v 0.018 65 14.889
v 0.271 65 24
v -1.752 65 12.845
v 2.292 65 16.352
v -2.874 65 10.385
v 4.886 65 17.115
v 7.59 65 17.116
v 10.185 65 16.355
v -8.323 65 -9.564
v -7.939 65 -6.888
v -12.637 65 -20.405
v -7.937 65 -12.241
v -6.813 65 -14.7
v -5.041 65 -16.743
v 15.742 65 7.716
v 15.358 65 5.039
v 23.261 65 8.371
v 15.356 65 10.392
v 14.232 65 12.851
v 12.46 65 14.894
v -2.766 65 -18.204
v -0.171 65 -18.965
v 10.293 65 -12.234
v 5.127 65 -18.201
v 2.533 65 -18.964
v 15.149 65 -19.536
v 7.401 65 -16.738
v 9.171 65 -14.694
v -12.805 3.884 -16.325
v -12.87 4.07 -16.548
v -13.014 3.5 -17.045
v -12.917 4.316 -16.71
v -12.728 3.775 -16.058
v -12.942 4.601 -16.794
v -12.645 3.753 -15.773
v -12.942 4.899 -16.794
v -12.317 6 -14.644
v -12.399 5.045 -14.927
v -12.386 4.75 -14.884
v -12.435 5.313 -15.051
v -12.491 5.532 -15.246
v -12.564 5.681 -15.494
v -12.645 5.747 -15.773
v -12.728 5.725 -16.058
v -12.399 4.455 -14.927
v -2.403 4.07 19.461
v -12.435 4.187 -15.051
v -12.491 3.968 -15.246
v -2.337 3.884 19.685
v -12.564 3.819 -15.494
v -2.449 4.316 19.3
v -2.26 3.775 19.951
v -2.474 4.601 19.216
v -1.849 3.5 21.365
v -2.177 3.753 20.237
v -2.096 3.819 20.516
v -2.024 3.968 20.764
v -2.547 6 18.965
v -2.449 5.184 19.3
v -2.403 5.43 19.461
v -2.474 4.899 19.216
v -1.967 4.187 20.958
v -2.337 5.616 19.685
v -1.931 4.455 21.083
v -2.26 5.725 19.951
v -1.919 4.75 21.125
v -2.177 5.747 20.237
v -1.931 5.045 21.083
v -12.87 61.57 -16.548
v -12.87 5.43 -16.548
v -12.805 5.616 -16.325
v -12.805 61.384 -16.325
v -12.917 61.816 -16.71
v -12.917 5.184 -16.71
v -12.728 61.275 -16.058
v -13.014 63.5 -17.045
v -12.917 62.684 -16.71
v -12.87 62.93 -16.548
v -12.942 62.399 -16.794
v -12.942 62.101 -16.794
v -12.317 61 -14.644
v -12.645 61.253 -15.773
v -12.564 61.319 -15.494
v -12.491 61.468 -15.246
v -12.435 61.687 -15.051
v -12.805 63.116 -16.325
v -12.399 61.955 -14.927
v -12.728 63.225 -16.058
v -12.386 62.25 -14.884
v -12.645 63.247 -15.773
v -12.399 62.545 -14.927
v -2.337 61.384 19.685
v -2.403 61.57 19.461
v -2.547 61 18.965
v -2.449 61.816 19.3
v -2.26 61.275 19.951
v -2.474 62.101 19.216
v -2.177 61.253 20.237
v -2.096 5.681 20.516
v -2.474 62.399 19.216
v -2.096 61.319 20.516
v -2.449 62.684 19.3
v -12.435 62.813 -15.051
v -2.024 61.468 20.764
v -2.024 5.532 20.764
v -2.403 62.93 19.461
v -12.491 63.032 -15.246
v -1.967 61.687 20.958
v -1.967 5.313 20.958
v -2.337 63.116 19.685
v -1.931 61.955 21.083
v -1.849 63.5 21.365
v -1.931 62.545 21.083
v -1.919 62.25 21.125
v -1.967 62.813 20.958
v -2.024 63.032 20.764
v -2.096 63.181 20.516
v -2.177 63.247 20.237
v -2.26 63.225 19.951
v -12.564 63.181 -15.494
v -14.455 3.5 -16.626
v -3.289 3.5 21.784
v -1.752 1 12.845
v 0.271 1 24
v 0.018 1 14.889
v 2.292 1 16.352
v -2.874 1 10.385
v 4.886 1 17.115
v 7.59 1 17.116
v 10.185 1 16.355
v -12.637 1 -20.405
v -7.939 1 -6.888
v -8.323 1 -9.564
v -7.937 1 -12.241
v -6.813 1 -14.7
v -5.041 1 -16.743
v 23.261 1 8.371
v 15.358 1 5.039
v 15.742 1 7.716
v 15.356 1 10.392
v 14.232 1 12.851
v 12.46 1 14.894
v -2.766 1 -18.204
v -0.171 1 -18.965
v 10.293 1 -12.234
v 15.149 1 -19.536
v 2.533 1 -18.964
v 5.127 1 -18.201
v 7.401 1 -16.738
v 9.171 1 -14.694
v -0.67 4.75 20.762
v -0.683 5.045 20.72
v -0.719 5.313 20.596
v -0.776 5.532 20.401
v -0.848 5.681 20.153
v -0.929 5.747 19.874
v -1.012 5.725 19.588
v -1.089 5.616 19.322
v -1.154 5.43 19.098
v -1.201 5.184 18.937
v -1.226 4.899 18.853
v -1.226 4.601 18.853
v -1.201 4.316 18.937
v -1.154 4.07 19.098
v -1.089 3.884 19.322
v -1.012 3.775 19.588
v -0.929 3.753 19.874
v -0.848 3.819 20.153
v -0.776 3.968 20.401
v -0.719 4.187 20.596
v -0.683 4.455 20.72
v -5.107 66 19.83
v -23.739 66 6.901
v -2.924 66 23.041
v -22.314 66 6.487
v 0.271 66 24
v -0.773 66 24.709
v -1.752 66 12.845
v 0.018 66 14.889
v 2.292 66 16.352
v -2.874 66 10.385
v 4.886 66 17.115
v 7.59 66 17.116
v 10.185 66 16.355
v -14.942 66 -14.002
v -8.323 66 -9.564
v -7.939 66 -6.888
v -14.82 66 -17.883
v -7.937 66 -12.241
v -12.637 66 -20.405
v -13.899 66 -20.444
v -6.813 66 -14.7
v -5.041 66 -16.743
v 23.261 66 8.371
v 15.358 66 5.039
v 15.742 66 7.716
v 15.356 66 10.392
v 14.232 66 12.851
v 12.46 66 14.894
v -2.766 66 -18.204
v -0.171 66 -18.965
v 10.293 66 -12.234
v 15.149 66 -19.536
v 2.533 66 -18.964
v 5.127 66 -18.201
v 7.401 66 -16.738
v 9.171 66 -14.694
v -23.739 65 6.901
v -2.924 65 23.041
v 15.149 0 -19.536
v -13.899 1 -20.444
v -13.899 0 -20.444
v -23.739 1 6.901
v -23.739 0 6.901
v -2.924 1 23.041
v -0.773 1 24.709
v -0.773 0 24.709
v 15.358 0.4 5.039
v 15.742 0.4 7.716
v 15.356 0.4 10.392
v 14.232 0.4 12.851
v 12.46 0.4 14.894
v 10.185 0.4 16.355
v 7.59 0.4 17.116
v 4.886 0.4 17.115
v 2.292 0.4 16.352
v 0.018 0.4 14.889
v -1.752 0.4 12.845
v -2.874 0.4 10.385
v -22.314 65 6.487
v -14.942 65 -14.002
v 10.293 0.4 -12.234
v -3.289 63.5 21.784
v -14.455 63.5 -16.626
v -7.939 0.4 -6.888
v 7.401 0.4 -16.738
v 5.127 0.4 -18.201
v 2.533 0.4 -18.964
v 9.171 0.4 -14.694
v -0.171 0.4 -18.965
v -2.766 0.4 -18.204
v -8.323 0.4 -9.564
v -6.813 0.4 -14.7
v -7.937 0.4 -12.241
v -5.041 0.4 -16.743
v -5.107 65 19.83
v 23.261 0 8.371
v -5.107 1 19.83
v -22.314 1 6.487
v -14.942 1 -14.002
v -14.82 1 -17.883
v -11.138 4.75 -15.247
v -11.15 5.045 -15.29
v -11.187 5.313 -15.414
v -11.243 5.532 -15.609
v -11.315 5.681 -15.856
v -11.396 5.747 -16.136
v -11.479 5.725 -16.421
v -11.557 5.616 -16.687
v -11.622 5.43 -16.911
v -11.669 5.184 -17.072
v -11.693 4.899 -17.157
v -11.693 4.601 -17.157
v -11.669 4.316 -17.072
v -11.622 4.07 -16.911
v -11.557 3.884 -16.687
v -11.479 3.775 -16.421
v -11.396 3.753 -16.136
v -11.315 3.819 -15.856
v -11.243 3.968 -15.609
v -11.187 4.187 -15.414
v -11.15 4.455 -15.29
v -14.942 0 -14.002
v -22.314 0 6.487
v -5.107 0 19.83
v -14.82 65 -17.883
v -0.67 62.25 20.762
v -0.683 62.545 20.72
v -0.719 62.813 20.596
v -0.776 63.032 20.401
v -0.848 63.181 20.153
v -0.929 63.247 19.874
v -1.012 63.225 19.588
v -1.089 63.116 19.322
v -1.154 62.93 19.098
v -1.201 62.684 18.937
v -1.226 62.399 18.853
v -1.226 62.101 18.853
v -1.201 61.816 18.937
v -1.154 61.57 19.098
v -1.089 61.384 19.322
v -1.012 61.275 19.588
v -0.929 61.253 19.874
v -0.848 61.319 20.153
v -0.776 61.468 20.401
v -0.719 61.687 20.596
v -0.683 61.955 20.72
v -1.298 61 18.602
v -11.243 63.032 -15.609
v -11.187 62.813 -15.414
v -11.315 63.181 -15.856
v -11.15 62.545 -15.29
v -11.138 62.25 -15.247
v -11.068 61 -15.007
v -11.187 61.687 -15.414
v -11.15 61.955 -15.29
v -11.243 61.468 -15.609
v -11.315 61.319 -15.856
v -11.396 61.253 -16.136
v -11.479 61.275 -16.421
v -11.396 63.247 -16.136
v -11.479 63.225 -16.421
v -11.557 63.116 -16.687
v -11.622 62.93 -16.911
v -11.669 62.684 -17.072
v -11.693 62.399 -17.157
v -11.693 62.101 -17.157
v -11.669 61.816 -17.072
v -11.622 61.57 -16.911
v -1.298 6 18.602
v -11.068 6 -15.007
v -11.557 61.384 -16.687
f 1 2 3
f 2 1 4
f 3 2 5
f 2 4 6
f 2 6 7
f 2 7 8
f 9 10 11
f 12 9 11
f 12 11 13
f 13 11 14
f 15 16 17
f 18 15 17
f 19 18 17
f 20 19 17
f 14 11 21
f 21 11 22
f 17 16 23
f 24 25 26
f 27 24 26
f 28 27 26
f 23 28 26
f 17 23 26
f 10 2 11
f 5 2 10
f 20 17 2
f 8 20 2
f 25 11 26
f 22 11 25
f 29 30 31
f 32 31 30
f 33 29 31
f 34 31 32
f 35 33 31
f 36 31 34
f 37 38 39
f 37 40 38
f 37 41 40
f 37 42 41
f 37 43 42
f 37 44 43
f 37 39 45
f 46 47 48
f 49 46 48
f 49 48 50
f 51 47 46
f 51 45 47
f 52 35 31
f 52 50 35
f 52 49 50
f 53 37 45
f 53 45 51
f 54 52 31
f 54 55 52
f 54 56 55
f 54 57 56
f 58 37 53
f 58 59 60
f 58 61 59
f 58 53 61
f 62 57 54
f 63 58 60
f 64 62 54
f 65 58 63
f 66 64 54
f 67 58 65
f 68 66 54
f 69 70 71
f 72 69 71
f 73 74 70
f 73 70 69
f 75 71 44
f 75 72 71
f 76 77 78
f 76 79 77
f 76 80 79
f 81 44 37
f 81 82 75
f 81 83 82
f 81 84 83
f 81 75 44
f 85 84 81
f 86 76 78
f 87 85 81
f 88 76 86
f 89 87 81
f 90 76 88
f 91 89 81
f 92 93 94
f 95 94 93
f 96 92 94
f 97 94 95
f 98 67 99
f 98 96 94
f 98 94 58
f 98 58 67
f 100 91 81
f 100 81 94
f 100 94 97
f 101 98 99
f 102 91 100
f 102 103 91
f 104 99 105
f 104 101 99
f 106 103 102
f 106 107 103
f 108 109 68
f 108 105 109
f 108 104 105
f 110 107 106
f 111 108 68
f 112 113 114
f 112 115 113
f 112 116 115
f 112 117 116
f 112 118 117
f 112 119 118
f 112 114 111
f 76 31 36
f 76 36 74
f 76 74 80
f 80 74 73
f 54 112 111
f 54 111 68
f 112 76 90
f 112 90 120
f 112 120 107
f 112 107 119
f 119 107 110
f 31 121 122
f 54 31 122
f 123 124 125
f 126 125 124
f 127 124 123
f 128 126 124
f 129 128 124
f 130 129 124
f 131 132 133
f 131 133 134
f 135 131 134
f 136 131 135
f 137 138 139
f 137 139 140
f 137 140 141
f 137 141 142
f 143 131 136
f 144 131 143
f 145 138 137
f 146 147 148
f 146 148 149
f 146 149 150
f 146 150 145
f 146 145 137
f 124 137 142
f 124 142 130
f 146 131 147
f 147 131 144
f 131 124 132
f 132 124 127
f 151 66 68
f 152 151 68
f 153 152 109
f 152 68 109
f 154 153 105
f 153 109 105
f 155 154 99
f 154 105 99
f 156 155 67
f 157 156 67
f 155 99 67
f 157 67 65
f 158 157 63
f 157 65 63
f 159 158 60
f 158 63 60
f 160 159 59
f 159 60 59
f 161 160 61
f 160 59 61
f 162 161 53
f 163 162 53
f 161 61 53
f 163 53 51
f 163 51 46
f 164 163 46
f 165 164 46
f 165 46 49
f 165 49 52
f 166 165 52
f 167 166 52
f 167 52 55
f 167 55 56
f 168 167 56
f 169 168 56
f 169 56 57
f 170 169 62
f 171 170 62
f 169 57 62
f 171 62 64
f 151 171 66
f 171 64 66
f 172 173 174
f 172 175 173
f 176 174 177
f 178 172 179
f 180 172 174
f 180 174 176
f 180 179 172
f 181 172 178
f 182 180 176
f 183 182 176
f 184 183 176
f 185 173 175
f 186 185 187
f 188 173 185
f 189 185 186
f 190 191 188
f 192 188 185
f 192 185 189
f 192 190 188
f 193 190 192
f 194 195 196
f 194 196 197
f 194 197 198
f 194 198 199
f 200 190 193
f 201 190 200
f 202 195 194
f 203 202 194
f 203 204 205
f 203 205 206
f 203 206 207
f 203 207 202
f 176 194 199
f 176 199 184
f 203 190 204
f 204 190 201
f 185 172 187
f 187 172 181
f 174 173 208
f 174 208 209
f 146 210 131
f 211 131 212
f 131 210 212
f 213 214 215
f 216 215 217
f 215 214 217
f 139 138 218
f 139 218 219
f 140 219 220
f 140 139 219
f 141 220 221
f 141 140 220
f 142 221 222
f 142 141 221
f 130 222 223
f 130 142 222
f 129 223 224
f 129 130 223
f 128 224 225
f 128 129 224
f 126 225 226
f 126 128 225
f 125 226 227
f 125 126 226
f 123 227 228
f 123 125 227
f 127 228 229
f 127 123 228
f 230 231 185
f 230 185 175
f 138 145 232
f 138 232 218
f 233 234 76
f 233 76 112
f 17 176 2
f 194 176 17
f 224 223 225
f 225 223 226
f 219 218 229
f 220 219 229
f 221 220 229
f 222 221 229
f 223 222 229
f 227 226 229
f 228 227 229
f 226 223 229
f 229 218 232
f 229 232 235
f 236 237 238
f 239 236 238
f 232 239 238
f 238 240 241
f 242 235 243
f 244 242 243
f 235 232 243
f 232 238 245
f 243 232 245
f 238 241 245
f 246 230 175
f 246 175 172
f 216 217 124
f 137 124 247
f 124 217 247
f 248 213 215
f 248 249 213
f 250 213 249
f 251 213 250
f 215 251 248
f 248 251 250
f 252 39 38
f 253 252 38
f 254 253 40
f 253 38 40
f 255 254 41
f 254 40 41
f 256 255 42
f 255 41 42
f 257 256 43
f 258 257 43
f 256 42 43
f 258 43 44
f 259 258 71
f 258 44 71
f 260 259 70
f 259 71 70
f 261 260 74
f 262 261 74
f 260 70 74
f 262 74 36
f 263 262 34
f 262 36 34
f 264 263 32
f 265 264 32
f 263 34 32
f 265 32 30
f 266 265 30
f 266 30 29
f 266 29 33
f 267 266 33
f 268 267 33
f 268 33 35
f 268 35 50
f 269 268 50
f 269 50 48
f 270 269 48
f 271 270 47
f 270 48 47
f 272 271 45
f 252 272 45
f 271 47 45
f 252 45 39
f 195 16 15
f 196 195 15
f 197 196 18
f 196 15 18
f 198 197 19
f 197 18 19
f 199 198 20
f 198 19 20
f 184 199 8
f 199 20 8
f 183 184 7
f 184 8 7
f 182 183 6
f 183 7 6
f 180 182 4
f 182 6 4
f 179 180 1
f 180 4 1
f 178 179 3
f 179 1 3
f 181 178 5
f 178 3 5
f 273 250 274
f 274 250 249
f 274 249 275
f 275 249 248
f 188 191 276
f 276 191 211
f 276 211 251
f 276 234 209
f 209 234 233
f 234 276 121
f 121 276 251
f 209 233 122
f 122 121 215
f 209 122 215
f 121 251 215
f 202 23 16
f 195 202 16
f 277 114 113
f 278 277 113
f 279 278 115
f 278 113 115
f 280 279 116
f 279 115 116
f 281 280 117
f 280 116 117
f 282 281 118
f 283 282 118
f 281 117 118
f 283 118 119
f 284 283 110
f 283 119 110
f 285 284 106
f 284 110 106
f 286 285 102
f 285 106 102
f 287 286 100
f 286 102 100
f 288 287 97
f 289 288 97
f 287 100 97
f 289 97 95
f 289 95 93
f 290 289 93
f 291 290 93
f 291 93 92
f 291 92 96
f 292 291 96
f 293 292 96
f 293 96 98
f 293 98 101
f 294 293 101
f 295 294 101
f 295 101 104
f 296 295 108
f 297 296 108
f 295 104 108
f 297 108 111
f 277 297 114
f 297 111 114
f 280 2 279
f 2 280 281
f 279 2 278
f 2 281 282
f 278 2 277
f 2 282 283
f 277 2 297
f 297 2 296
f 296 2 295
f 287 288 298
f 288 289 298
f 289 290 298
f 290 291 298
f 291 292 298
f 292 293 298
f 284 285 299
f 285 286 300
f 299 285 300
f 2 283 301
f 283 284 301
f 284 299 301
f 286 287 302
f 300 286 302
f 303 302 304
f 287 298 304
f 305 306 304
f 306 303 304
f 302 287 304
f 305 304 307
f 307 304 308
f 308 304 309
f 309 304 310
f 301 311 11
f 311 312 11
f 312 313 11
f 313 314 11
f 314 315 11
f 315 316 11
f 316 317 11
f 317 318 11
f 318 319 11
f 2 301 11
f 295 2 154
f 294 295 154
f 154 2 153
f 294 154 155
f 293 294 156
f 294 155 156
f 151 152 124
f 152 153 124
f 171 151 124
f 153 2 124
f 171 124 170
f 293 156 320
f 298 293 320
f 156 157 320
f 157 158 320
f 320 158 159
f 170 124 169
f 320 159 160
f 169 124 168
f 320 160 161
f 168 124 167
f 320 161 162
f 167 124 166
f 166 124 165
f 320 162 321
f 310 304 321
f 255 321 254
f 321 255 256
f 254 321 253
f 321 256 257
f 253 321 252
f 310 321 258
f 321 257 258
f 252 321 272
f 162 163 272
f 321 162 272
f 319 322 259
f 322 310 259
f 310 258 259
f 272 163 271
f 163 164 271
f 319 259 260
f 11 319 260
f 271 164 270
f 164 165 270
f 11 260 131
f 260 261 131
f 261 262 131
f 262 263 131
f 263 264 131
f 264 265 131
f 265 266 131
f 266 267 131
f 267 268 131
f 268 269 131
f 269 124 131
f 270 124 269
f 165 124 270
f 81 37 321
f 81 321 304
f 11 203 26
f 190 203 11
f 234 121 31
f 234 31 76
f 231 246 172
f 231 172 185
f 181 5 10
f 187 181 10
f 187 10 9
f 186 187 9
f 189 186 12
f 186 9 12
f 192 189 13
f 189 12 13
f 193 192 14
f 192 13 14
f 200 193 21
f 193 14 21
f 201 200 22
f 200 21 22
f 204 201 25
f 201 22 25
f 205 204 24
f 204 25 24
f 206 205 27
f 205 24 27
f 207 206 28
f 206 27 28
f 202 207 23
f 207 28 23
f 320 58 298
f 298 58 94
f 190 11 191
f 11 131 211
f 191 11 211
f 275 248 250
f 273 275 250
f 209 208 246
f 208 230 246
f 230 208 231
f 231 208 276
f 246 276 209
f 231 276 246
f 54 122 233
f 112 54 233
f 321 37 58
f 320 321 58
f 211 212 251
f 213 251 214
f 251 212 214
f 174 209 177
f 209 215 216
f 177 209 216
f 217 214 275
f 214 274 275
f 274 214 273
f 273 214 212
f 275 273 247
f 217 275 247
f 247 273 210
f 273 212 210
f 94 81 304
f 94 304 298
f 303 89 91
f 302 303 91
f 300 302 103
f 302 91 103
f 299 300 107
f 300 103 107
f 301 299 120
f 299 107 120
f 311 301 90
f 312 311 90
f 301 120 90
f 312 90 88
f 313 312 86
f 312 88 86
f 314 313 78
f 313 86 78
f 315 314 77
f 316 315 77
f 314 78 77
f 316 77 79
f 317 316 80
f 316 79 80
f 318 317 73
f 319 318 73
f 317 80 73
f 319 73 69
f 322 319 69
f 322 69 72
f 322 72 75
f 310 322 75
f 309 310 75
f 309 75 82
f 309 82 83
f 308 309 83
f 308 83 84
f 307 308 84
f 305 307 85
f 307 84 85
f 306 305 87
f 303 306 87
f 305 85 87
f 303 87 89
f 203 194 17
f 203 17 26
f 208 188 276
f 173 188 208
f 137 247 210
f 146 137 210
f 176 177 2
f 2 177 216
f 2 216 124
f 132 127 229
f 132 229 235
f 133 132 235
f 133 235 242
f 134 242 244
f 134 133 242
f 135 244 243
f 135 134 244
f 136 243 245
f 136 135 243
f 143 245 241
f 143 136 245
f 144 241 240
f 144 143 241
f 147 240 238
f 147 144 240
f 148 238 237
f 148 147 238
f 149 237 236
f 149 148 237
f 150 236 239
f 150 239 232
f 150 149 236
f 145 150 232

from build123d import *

# Parameters (mm, degrees)
BOSS_EXTRUDE1_DEPTH            = 1
BOSS_EXTRUDE2_DEPTH            = 65
SKETCH4_W                      = 40
SKETCH4_H                      = 60
CUT_EXTRUDE1_DEPTH             = 1.5
SKETCH5_W                      = 35
SKETCH5_H                      = 55
CUT_EXTRUDE2_DEPTH             = 1.3
BOSS_EXTRUDE3_DEPTH            = 1
CUT_EXTRUDE3_REACH             = 75.478
CUT_EXTRUDE3_DIRECTION_2_REACH = 75.478
CUT_EXTRUDE4_DEPTH             = 0.6
CUT_EXTRUDE4_DIRECTION_2_REACH = 75.478
SKETCH8_R                      = 1
CUT_EXTRUDE5_DEPTH             = 1.3


with BuildPart() as part:
    # Sketch1 → Boss-Extrude1 (new body)
    with BuildSketch(Plane(origin=(0, 0, 0), x_dir=(1, 0, 0), z_dir=(0, 1, 0))):
        Polygon((23.261119363, -8.370540245), (15.148938036, 19.535999959), (-13.898560763, 20.444452223), (-23.738720982, -6.900633603), (-0.772775653, -24.709278334), align=None)
    extrude(amount=BOSS_EXTRUDE1_DEPTH)

    # Sketch2 → Boss-Extrude2 (add)
    with BuildSketch(Plane(origin=(0, 1, 0), x_dir=(1, 0, 0), z_dir=(0, 1, 0))):
        Polygon((-2.923895425, -23.04122038), (-0.772775653, -24.709278334), (-13.898560763, 20.444452223), (-14.820245584, 17.883157492), align=None)
        Polygon((-13.898560763, 20.444452223), (-0.772775653, -24.709278334), (0.270689735, -23.999909017), (-12.637422708, 20.405010489), align=None)
    extrude(amount=BOSS_EXTRUDE2_DEPTH)

    # Sketch4 → Cut-Extrude1 (cut)
    with BuildSketch(Plane(origin=(-8.872070504, 0, 2.579031444), x_dir=(0.2791364928440536, 0, 0.9602514349704049), z_dir=(-0.9602514349704049, 0, 0.2791364928440536))):
        with Locations((0, 33.5)):
            Rectangle(SKETCH4_W, SKETCH4_H)
    extrude(amount=-CUT_EXTRUDE1_DEPTH, mode=Mode.SUBTRACT)

    # Sketch5 → Cut-Extrude2 (cut)
    with BuildSketch(Plane(origin=(-7.431693352, 0, 2.160326705), x_dir=(0.2791364928440537, 0, 0.9602514349704049), z_dir=(-0.9602514349704049, 0, 0.2791364928440537))):
        with Locations((0, 33.5)):
            Rectangle(SKETCH5_W, SKETCH5_H)
    extrude(amount=-CUT_EXTRUDE2_DEPTH, mode=Mode.SUBTRACT)

    # Sketch7 → Boss-Extrude3 (add)
    with BuildSketch(Plane(origin=(0, 66, 0), x_dir=(1, 0, 0), z_dir=(0, 1, 0))):
        Polygon((-0.772775653, -24.709278334), (23.261119363, -8.370540245), (15.148938036, 19.535999959), (-13.898560763, 20.444452223), (-23.738720982, -6.900633603), align=None)
    extrude(amount=-BOSS_EXTRUDE3_DEPTH)

    # Cut-Extrude3: up to this face of the body (flat: up to its plane)
    cut_extrude3_end = Plane(part.part.faces().sort_by_distance((0, 66, 0))[0])
    # Sketch6 → Cut-Extrude3 (cut, up to the picked face)
    with BuildSketch(Plane(origin=(0, 1, 0), x_dir=(1, 0, 0), z_dir=(0, 1, 0)), mode=Mode.PRIVATE) as cut_extrude3_sk1:
        Polygon((-22.314397723, -6.486595587), (-5.107109693, -19.829764132), (-14.941634759, 14.001773661), align=None)
    cut_extrude3_tool1 = split(extrude(cut_extrude3_sk1.sketch, amount=CUT_EXTRUDE3_REACH, mode=Mode.PRIVATE), bisect_by=cut_extrude3_end, keep=Keep.BOTH, mode=Mode.PRIVATE)
    add(cut_extrude3_tool1.solids().sort_by(Axis((-14.121047, 1, 4.104862), (0, 1, 0)))[0], mode=Mode.SUBTRACT)

    # Cut-Extrude3 direction 2: up to this face of the body (flat: up to its plane)
    cut_extrude3_direction_2_end = Plane(part.part.faces().sort_by_distance((0, 0, 0))[0])
    # Sketch6 → Cut-Extrude3 direction 2 (cut, up to the picked face)
    with BuildSketch(Plane(origin=(0, 1, 0), x_dir=(1, 0, 0), z_dir=(0, 1, 0)), mode=Mode.PRIVATE) as cut_extrude3_direction_2_sk1:
        Polygon((-22.314397723, -6.486595587), (-5.107109693, -19.829764132), (-14.941634759, 14.001773661), align=None)
    cut_extrude3_direction_2_tool1 = split(extrude(cut_extrude3_direction_2_sk1.sketch, amount=-CUT_EXTRUDE3_DIRECTION_2_REACH, mode=Mode.PRIVATE), bisect_by=cut_extrude3_direction_2_end, keep=Keep.BOTH, mode=Mode.PRIVATE)
    add(cut_extrude3_direction_2_tool1.solids().sort_by(Axis((-14.121047, 1, 4.104862), (0, -1, 0)))[0], mode=Mode.SUBTRACT)

    # Sketch3 → Cut-Extrude4 (cut)
    with BuildSketch(Plane(origin=(0, 1, 0), x_dir=(1, 0, 0), z_dir=(0, 1, 0))):
        with BuildLine():
            Line((10.293293236, 12.233810418), (15.358065736, -5.038944994))
            ThreePointArc((15.358065736, -5.038944994), (8.914963643, -16.828195836), (-2.874287199, -10.385093743))
            Line((-2.874287199, -10.385093743), (-7.939059699, 6.887661669))
            ThreePointArc((-7.939059699, 6.887661669), (-1.495957606, 18.676912511), (10.293293236, 12.233810418))
        make_face()
    extrude(amount=-CUT_EXTRUDE4_DEPTH, mode=Mode.SUBTRACT)

    # Cut-Extrude4 direction 2: up to this face of the body (flat: up to its plane)
    cut_extrude4_direction_2_end = Plane(part.part.faces().sort_by_distance((2.593442955, 66, -0.753890642))[0])
    # Sketch3 → Cut-Extrude4 direction 2 (cut, up to the picked face)
    with BuildSketch(Plane(origin=(0, 1, 0), x_dir=(1, 0, 0), z_dir=(0, 1, 0)), mode=Mode.PRIVATE) as cut_extrude4_direction_2_sk1:
        with BuildLine():
            Line((10.293293236, 12.233810418), (15.358065736, -5.038944994))
            ThreePointArc((15.358065736, -5.038944994), (8.914963643, -16.828195836), (-2.874287199, -10.385093743))
            Line((-2.874287199, -10.385093743), (-7.939059699, 6.887661669))
            ThreePointArc((-7.939059699, 6.887661669), (-1.495957606, 18.676912511), (10.293293236, 12.233810418))
        make_face()
    cut_extrude4_direction_2_tool1 = split(extrude(cut_extrude4_direction_2_sk1.sketch, amount=CUT_EXTRUDE4_DIRECTION_2_REACH, mode=Mode.PRIVATE), bisect_by=cut_extrude4_direction_2_end, keep=Keep.BOTH, mode=Mode.PRIVATE)
    add(cut_extrude4_direction_2_tool1.solids().sort_by(Axis((3.709503, 1, -0.924358), (0, 1, 0)))[0], mode=Mode.SUBTRACT)

    # Sketch8 → Cut-Extrude5 (cut)
    with BuildSketch(Plane(origin=(-7.431693352, 0, 2.160326705), x_dir=(0.2791364928440537, 0, 0.9602514349704049), z_dir=(-0.9602514349704049, 0, 0.2791364928440537))):
        with Locations((-18.75, 4.75)):
            Circle(SKETCH8_R)
        with Locations((18.75, 4.75)):
            Circle(SKETCH8_R)
        with Locations((-18.75, 62.25)):
            Circle(SKETCH8_R)
        with Locations((18.75, 62.25)):
            Circle(SKETCH8_R)
    extrude(amount=-CUT_EXTRUDE5_DEPTH, mode=Mode.SUBTRACT)


solid = part.part
